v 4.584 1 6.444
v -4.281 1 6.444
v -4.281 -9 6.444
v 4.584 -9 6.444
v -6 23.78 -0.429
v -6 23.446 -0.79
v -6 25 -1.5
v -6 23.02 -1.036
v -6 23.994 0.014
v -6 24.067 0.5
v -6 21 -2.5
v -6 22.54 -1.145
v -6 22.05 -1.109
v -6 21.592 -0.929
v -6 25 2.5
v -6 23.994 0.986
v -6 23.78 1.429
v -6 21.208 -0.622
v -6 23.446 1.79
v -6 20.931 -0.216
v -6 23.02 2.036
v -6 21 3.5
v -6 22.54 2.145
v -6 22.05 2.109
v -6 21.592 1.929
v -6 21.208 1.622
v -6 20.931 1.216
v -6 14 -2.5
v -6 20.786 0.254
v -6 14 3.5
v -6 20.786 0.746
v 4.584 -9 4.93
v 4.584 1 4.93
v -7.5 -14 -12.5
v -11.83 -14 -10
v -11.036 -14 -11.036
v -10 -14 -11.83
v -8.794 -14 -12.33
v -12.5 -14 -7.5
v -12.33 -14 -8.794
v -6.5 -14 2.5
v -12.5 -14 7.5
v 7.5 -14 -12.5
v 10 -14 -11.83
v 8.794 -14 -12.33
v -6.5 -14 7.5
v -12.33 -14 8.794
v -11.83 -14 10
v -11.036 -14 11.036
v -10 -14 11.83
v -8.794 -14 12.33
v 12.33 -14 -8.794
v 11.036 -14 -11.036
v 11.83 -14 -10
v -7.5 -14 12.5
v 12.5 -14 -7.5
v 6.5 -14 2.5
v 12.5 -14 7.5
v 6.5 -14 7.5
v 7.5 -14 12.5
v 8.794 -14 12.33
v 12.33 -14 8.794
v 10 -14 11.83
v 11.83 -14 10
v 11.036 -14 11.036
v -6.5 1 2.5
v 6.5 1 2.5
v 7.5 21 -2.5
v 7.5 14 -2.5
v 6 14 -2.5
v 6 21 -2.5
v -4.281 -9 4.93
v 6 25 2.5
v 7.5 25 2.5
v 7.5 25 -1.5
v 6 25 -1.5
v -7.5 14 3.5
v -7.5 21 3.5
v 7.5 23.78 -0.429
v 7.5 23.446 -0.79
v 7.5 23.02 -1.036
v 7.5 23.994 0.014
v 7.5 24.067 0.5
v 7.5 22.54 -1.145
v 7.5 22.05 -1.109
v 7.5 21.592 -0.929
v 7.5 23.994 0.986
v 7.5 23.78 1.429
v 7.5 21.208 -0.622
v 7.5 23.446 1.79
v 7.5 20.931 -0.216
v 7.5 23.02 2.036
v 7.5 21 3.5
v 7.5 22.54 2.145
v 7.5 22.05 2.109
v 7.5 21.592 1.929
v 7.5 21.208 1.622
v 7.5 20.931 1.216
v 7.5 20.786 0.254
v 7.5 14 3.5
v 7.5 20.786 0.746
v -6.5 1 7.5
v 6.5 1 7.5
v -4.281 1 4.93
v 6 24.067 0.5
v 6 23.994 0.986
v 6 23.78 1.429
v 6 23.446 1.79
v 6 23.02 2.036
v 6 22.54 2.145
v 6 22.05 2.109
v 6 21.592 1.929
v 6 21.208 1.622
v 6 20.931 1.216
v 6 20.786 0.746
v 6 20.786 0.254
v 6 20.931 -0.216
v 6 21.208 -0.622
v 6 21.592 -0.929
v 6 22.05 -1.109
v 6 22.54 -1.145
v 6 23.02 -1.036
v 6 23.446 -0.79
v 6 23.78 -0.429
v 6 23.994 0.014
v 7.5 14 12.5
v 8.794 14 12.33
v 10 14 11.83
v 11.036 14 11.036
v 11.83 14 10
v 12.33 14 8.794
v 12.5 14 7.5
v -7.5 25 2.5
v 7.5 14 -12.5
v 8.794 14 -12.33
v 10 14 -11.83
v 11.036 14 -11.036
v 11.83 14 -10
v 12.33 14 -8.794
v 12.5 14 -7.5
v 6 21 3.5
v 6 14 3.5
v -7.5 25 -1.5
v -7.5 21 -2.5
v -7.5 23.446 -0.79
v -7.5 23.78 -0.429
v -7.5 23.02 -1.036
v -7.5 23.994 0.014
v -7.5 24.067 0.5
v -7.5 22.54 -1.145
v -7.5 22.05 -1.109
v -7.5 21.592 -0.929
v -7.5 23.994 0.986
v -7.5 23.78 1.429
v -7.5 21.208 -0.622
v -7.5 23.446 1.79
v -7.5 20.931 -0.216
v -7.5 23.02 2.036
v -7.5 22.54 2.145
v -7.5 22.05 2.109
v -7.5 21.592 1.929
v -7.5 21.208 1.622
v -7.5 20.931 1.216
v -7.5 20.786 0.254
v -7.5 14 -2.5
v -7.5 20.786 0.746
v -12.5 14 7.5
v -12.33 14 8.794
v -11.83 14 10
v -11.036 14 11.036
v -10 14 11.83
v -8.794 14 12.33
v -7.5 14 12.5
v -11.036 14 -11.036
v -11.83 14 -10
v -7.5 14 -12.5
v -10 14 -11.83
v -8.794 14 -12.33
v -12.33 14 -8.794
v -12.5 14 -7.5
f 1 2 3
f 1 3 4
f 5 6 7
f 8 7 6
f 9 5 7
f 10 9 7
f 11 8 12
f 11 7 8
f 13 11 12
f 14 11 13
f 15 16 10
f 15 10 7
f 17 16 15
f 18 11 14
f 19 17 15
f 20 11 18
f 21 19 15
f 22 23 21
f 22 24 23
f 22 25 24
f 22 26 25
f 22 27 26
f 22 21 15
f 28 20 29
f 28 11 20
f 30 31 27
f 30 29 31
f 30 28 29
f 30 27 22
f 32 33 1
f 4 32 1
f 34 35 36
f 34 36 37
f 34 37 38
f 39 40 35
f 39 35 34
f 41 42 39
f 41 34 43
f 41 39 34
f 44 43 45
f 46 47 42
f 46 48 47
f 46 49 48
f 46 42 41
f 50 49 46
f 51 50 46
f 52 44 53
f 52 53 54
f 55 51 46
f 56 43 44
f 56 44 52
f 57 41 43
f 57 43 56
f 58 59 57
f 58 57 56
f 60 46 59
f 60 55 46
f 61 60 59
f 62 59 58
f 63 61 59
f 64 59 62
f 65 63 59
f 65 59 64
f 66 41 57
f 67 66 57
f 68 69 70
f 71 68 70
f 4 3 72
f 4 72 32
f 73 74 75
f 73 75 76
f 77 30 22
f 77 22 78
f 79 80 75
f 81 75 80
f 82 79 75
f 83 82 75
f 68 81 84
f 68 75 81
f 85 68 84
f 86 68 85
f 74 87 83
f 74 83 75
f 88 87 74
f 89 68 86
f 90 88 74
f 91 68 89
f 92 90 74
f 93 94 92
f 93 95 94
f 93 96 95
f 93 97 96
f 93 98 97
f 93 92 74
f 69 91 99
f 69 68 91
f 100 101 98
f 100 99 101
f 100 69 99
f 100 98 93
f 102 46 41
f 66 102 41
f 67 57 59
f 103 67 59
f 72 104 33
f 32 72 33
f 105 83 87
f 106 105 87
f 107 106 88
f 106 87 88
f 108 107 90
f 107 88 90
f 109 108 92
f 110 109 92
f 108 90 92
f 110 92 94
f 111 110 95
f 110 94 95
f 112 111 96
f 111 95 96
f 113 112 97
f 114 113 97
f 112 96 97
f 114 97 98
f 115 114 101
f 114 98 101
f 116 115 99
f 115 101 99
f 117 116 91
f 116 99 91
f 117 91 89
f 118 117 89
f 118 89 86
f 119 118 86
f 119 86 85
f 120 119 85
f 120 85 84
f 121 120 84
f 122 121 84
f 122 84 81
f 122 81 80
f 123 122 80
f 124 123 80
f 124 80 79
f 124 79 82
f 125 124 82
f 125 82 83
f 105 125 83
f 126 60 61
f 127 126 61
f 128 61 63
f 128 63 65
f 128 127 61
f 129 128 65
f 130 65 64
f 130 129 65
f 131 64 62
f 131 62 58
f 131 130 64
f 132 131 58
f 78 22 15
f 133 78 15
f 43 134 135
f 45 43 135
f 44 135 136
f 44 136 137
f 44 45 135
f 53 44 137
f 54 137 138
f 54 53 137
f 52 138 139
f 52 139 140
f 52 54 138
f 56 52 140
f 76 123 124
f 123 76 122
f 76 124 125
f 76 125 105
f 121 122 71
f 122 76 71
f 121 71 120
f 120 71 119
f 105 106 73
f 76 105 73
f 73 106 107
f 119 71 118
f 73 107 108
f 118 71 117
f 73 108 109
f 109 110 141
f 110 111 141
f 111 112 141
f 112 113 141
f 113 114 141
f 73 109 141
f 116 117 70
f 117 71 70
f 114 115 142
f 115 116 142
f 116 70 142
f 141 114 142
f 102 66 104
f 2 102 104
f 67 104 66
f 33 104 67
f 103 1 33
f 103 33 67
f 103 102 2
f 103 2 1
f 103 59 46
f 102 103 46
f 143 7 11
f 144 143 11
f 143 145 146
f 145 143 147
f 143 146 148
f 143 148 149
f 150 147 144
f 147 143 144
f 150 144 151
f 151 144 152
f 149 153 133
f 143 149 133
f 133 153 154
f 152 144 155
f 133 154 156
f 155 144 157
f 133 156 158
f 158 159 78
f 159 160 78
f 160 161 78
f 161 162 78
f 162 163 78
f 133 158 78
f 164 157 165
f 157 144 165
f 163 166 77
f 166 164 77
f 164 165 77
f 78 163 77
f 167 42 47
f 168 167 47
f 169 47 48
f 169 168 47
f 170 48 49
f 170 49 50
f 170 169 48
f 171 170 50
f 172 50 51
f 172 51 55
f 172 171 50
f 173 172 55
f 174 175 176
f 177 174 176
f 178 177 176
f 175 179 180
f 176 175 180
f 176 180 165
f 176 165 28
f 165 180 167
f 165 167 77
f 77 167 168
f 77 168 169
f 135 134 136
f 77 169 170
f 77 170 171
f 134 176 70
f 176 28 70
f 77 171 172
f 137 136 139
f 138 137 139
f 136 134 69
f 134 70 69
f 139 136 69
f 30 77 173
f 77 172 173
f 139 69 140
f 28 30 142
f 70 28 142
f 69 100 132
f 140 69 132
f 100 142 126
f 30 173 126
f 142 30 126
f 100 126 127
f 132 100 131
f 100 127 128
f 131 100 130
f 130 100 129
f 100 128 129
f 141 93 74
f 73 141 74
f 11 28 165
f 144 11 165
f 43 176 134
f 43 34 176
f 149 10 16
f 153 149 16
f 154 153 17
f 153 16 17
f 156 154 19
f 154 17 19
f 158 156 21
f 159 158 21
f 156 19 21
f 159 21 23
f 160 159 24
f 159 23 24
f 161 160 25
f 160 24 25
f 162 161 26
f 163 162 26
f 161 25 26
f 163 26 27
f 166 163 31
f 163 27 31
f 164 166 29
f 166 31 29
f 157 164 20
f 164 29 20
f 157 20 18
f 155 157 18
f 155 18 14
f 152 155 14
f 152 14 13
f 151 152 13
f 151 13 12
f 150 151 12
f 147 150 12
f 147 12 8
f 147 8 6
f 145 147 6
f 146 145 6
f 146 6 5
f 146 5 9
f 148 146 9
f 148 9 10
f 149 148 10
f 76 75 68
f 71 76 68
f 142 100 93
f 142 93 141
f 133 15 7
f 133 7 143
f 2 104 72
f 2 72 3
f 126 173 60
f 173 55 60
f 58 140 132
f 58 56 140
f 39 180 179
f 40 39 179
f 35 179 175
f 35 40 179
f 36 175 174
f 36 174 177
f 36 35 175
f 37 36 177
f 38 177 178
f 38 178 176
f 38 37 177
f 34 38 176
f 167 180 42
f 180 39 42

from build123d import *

# Parameters (mm, degrees)
F0_W      = 25
F0_H      = 25
F1_DEPTH  = 14
F3_DEPTH  = 15
F4_W      = 1.5
F4_H      = 6
F5_DEPTH  = 11
F6_R      = 1.65
F7_DEPTH  = 30.4
F8_R      = 5
F9_W      = 8.8653210551
F9_H      = 1.5135915019
F10_DEPTH = 10


with BuildPart() as f1:
    # F0 (on Front) → F1 (new body, symmetric)
    with BuildSketch(Plane.XZ):
        Rectangle(F0_W, F0_H)
    extrude(amount=F1_DEPTH, both=True)

    # F2 (on face) → F3 (cut)
    with BuildSketch(Plane.XZ.offset(14)):
        Polygon((-6.5, 2.5), (0, 2.5), (6.5, 2.5), (6.5, 7.5), (-6.5, 7.5), align=None)
    extrude(amount=-F3_DEPTH, mode=Mode.SUBTRACT)

    # F4 (on face) → F5 (join)
    with BuildSketch(Plane(origin=(0, 14, 0), x_dir=(-1, 0, 0), z_dir=(0, 1, 0))):
        with Locations((-6.75, 0.5)):
            Rectangle(F4_W, F4_H)
        with Locations((6.75, 0.5)):
            Rectangle(F4_W, F4_H)
    extrude(amount=F5_DEPTH)

    # F6 (on face) → F7 (cut)
    with BuildSketch(Plane.YZ.offset(7.5)):
        with Locations((22.4171727896, 0.5)):
            Circle(F6_R)
        Polygon((25, 2.4996667635), (25, 3.5), (21, 3.5), align=None)
        Polygon((25, -2.5), (25, -1.5), (21, -2.5), align=None)
    extrude(amount=-F7_DEPTH, mode=Mode.SUBTRACT)

    # F8
    f8_edges = [f1.edges().sort_by_distance(p)[0] for p in [
        (-12.5, 0, 12.5),
        (12.5, 0, 12.5),
        (12.5, 0, -12.5),
        (-12.5, 0, -12.5),
    ]]
    fillet(f8_edges, radius=F8_R)

    # F9 (on face) → F10 (join)
    with BuildSketch(Plane.XZ.offset(-1)):
        with Locations((0.1513590105, 5.6867792737)):
            Rectangle(F9_W, F9_H)
    extrude(amount=F10_DEPTH)


solid = f1.part
